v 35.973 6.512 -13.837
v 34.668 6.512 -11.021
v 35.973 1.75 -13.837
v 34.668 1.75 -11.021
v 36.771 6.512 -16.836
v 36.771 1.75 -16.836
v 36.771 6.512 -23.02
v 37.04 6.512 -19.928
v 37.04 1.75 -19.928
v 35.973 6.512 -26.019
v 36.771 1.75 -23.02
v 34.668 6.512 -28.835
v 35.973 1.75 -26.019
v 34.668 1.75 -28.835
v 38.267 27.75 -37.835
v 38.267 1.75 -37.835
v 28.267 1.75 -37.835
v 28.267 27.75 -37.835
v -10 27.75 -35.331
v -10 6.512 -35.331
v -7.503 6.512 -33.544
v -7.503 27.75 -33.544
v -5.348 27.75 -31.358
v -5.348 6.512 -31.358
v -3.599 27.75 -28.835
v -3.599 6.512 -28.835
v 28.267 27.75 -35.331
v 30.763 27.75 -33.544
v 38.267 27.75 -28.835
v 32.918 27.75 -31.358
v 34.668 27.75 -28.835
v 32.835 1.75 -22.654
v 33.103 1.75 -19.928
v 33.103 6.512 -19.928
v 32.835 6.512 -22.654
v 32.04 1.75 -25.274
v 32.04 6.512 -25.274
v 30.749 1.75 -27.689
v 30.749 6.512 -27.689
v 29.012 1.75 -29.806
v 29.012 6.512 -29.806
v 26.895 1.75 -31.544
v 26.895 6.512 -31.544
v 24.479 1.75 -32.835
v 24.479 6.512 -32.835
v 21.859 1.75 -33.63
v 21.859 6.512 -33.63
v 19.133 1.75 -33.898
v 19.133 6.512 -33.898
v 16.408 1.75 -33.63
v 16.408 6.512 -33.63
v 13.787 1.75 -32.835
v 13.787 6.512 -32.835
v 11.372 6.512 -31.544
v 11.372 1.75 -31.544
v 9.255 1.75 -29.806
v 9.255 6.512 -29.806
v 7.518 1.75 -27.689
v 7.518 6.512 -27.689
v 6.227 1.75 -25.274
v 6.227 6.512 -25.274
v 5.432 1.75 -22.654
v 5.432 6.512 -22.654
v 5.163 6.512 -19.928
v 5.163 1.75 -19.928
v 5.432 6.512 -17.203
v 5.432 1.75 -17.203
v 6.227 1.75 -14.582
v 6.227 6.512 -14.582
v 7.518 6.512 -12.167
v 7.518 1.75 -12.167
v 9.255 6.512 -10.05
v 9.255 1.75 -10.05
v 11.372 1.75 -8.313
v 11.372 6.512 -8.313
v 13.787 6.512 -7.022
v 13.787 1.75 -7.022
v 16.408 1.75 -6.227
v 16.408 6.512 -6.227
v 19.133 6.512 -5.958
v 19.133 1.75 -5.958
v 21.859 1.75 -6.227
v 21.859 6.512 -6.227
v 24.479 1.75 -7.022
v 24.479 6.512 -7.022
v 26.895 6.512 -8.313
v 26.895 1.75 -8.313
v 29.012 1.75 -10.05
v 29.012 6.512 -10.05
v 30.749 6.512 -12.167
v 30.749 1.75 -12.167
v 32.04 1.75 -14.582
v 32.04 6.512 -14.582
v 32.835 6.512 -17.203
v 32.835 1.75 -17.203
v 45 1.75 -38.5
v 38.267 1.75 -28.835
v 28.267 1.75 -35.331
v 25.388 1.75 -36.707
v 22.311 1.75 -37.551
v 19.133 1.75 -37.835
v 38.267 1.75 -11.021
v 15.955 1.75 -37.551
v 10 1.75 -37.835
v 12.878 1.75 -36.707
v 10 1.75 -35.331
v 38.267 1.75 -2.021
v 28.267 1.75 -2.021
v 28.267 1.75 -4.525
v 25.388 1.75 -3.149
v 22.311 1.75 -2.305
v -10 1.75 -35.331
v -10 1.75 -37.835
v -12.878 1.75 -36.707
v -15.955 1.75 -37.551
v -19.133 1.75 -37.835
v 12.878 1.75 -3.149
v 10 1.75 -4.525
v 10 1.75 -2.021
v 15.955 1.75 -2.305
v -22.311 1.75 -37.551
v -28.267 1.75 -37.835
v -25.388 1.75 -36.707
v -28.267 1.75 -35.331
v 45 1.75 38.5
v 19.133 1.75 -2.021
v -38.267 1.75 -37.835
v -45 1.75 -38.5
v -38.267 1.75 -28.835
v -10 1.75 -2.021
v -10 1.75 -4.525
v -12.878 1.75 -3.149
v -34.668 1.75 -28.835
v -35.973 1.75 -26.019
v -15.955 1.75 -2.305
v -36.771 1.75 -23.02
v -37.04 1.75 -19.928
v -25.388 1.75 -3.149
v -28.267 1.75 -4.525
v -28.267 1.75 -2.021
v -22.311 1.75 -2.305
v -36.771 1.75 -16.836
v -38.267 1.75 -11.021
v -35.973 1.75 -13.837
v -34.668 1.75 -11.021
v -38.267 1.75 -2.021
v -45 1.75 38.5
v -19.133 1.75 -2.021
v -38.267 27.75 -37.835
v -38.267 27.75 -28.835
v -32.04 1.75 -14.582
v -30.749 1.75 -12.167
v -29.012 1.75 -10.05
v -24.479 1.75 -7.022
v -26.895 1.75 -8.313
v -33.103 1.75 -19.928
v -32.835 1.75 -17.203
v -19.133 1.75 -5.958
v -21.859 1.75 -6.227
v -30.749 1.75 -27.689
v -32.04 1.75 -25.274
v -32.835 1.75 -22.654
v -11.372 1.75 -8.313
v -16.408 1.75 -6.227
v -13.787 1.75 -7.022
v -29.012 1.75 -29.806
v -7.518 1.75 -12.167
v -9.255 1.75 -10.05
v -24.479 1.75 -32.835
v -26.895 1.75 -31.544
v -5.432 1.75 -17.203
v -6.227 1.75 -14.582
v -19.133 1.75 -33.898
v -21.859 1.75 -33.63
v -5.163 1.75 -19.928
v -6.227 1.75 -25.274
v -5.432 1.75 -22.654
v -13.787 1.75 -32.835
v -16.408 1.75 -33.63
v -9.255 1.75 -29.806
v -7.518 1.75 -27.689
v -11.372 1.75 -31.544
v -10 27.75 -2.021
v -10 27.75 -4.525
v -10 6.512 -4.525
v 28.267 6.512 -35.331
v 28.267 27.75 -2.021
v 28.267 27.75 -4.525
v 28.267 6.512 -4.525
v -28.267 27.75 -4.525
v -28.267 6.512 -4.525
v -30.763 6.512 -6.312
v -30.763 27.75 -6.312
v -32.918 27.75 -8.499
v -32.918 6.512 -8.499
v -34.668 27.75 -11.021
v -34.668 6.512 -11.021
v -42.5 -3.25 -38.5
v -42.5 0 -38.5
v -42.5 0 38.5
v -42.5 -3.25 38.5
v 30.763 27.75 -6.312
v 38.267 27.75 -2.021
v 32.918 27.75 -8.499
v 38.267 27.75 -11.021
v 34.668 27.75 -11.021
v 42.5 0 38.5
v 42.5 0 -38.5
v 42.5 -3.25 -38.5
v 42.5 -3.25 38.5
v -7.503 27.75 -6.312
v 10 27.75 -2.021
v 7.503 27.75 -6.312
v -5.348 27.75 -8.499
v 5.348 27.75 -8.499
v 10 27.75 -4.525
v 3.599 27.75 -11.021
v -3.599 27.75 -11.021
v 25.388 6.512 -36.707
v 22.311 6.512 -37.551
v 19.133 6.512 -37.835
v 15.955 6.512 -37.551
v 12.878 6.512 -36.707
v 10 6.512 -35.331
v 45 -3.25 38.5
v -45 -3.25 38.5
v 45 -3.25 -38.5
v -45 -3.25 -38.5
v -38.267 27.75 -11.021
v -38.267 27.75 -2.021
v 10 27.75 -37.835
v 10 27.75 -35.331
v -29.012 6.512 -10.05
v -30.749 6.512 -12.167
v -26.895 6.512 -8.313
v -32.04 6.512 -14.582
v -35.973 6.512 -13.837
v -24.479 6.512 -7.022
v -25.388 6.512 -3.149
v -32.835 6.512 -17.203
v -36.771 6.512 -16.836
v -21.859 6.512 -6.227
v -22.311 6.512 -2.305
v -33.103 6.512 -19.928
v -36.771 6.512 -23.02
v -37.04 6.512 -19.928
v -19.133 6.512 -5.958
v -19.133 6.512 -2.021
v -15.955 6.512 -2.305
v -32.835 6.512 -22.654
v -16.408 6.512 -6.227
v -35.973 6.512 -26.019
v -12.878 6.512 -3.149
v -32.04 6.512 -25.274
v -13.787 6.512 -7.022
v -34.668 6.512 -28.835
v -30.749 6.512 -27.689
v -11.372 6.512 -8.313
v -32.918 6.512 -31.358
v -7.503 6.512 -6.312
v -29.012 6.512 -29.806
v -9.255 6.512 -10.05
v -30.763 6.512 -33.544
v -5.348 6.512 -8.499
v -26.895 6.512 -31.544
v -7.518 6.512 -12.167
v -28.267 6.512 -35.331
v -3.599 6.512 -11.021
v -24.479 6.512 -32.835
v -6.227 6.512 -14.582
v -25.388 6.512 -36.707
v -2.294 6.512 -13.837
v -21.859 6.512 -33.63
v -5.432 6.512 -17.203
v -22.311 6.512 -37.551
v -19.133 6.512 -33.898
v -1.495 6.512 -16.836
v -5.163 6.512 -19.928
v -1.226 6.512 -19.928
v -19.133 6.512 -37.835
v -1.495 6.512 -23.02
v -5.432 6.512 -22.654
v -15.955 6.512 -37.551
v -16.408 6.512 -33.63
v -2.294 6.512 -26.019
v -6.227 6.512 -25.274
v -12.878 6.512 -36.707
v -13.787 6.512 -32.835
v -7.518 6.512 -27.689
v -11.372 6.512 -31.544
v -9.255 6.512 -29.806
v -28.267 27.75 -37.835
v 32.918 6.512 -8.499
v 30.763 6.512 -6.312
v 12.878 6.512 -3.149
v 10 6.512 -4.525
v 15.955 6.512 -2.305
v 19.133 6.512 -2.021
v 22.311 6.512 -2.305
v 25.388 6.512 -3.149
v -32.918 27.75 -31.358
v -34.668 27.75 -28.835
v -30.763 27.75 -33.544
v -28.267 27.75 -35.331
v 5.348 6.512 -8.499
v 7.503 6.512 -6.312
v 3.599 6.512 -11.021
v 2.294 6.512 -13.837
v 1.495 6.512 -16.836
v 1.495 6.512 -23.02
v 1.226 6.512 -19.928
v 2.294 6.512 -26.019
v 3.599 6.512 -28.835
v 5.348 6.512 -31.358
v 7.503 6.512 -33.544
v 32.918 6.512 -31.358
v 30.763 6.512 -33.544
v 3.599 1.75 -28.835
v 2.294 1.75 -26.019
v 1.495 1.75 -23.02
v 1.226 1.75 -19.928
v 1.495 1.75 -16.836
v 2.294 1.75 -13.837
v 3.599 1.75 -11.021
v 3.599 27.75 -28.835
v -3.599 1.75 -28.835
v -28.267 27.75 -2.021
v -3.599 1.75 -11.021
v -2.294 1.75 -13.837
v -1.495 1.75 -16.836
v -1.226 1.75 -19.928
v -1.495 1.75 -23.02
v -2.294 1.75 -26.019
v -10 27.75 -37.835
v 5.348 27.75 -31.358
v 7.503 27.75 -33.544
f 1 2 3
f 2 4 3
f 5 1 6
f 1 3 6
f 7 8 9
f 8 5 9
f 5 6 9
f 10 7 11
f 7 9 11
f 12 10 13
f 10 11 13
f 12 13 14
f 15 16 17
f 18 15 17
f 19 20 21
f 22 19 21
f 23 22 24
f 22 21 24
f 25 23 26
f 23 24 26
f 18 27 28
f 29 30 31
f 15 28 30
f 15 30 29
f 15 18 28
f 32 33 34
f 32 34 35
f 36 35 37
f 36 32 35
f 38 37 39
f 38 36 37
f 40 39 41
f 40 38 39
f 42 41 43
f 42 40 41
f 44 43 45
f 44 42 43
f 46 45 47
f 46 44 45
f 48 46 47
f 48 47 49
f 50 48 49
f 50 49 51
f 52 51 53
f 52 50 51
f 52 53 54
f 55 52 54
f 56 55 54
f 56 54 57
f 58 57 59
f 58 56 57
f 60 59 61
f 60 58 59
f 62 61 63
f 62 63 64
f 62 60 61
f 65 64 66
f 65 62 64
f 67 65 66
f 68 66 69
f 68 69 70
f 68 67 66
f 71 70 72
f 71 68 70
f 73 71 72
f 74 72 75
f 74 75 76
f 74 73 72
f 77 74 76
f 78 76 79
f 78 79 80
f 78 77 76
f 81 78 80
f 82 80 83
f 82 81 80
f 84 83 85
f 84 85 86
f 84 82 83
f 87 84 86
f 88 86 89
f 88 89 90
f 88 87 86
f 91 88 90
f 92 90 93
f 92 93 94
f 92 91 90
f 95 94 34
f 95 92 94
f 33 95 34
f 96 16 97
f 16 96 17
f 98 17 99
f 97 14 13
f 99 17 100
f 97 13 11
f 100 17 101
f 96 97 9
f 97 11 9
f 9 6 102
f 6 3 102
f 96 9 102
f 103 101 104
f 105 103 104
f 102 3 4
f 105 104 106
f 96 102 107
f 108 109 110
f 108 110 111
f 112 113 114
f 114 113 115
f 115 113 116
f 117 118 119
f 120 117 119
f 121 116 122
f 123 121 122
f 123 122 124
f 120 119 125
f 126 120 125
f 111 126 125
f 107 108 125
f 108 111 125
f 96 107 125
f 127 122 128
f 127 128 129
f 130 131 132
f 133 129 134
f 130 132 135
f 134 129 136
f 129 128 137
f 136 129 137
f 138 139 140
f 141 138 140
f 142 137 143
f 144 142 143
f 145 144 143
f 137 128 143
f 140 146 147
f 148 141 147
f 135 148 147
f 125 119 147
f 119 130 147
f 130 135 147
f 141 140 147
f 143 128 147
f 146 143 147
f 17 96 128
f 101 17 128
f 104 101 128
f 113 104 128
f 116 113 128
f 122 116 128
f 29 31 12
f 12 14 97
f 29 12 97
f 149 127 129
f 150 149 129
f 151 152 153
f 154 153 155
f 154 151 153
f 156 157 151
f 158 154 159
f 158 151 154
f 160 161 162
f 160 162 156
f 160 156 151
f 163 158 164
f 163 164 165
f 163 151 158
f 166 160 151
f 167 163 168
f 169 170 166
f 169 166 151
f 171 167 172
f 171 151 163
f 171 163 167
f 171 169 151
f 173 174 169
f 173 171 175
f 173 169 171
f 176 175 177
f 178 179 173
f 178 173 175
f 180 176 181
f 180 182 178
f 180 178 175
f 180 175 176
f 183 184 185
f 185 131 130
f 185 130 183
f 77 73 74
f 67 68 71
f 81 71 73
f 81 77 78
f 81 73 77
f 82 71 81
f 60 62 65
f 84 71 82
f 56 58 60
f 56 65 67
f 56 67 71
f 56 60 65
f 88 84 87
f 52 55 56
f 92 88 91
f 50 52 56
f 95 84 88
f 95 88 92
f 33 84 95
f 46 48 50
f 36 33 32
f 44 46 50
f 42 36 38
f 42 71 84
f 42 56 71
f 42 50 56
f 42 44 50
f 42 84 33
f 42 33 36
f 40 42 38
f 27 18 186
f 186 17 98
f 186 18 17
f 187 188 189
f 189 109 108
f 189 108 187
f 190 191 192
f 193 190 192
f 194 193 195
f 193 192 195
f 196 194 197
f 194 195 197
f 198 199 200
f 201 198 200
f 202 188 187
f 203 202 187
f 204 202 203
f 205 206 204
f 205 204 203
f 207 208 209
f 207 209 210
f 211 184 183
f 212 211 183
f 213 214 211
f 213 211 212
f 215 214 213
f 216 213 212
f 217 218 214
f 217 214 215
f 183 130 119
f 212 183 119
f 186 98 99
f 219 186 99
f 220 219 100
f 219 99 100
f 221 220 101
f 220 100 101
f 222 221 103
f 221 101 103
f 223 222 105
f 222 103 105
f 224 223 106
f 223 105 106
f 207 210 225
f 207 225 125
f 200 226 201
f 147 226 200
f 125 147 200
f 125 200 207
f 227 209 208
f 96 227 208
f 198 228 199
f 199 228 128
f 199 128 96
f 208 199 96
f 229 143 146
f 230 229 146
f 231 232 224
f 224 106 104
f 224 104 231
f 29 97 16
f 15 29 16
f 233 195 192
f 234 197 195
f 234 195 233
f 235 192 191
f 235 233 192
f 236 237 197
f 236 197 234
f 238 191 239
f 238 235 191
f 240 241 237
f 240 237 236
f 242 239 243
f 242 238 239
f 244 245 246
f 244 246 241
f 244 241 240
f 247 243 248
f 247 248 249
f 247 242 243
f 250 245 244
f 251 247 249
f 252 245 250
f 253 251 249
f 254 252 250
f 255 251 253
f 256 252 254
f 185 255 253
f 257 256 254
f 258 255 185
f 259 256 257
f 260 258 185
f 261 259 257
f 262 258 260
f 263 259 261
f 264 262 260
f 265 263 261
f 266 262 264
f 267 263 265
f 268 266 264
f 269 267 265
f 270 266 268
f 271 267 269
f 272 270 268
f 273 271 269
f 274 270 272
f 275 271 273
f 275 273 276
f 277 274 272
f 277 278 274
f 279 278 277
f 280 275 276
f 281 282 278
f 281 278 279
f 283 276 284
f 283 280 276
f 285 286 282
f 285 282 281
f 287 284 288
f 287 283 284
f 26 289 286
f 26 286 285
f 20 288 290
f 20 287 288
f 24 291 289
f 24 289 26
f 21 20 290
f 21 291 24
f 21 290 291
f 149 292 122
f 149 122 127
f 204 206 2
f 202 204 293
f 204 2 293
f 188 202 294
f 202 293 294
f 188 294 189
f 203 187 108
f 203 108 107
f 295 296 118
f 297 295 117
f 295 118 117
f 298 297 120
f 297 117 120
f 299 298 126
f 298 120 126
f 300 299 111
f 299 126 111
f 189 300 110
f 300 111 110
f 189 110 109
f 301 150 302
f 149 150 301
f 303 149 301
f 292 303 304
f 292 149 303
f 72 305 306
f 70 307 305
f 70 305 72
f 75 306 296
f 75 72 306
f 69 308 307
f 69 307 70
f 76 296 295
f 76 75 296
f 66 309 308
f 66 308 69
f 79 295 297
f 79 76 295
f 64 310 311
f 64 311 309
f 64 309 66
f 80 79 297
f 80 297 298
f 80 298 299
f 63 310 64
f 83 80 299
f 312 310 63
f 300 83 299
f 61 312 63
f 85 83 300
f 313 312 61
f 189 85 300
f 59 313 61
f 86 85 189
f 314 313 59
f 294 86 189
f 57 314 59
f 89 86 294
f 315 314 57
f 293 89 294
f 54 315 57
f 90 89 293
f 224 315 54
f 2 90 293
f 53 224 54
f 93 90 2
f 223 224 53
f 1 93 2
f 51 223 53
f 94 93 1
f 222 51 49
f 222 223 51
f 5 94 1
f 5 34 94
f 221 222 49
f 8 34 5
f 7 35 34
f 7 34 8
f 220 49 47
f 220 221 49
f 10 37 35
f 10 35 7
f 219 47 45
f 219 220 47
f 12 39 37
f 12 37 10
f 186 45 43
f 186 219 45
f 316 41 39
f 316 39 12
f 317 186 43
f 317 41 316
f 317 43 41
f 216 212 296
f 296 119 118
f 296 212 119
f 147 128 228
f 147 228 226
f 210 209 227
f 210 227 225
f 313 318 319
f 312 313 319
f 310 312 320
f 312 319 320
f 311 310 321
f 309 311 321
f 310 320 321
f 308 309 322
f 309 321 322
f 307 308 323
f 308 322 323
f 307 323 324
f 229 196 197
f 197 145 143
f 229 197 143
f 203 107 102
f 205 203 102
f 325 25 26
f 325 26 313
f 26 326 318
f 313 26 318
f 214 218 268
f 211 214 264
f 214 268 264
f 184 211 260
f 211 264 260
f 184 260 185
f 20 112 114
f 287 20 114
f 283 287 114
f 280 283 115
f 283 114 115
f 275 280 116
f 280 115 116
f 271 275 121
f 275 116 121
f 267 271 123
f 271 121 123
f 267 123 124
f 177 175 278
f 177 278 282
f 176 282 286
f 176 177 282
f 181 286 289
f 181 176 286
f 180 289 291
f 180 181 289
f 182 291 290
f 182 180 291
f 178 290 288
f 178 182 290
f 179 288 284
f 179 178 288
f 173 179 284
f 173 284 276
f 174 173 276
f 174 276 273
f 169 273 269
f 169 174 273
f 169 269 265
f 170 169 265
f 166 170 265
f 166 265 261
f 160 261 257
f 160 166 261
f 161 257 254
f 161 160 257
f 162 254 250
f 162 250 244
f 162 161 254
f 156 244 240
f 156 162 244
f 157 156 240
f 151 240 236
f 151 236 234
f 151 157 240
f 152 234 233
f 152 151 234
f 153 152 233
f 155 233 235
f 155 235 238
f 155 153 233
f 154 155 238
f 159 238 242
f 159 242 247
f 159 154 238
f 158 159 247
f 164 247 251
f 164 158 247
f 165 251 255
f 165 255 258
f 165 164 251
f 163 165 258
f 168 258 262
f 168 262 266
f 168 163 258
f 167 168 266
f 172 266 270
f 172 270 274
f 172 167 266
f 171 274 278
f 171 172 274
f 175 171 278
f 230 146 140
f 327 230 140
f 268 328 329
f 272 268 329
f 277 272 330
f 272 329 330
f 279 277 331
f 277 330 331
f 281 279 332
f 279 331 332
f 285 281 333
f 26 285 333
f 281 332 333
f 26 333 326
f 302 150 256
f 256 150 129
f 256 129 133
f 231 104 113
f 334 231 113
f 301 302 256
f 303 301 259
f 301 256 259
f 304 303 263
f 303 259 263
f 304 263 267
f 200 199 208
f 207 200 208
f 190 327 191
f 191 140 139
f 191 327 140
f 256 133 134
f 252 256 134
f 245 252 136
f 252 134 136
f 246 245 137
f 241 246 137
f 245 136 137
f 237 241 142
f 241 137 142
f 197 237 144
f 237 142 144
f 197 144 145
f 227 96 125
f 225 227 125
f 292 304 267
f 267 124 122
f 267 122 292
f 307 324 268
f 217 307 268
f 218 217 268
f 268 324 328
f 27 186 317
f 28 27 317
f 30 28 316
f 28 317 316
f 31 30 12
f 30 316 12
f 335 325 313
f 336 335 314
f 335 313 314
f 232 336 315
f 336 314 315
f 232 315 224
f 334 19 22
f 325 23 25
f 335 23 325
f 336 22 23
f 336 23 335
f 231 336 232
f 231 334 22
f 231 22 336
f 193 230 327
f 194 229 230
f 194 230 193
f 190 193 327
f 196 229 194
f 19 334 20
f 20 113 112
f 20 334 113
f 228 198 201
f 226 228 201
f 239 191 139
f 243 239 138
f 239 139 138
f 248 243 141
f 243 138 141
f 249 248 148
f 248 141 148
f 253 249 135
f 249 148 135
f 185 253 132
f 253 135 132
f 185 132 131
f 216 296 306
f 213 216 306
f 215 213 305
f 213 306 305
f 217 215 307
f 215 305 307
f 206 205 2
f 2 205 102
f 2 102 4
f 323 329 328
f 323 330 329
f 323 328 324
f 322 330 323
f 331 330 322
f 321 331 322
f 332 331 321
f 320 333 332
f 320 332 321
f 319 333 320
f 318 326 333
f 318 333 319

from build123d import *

# Parameters (mm, degrees)
SKETCH1_W           = 85
SKETCH1_H           = 77
BOSS_EXTRUDE1_DEPTH = 1.75
SKETCH3_R           = 17.907
SKETCH3_R_2         = 13.97
BOSS_EXTRUDE3_DEPTH = 4.7625
BOSS_EXTRUDE7_DEPTH = 26
SKETCH6_W           = 77
SKETCH6_H           = 5
BOSS_EXTRUDE8_DEPTH = 2.5


with BuildPart() as part:
    # Sketch1 → Boss-Extrude1 (new body)
    with BuildSketch(Plane(origin=(0, 0, 0), x_dir=(1, 0, 0), z_dir=(0, 1, 0))):
        Rectangle(SKETCH1_W, SKETCH1_H)
    extrude(amount=BOSS_EXTRUDE1_DEPTH)

    # Sketch3 → Boss-Extrude3 (add)
    with BuildSketch(Plane(origin=(0, 1.75, 0), x_dir=(1, 0, 0), z_dir=(0, 1, 0))):
        with Locations((19.133331774, 19.92813227)):
            Circle(SKETCH3_R)
        with Locations((19.133331774, 19.92813227)):
            Circle(SKETCH3_R_2, mode=Mode.SUBTRACT)
        with Locations((-19.133331774, 19.92813227)):
            Circle(SKETCH3_R)
        with Locations((-19.133331774, 19.92813227)):
            Circle(SKETCH3_R_2, mode=Mode.SUBTRACT)
    extrude(amount=BOSS_EXTRUDE3_DEPTH)

    # Sketch4 → Boss-Extrude7 (add)
    with BuildSketch(Plane(origin=(0, 1.75, 0), x_dir=(1, 0, 0), z_dir=(0, 1, 0))):
        with BuildLine():
            ThreePointArc((-34.668002675, 28.83513227), (-31.887785522, 32.497323119), (-28.266663548, 35.330823584))
            Line((-28.266663548, 35.330823584), (-28.266663548, 37.83513227))
            Line((-28.266663548, 37.83513227), (-38.266663548, 37.83513227))
            Line((-38.266663548, 37.83513227), (-38.266663548, 28.83513227))
            Line((-38.266663548, 28.83513227), (-34.668002675, 28.83513227))
        make_face()
        with BuildLine():
            ThreePointArc((-28.266663548, 4.525440956), (-31.887785522, 7.358941421), (-34.668002675, 11.02113227))
            Line((-34.668002675, 11.02113227), (-38.266663548, 11.02113227))
            Line((-38.266663548, 11.02113227), (-38.266663548, 2.02113227))
            Line((-38.266663548, 2.02113227), (-28.266663548, 2.02113227))
            Line((-28.266663548, 2.02113227), (-28.266663548, 4.525440956))
        make_face()
        with BuildLine():
            Line((0, 11.02113227), (-3.598660873, 11.02113227))
            ThreePointArc((-3.598660873, 11.02113227), (-6.378878026, 7.358941421), (-10, 4.525440956))
            Line((-10, 4.525440956), (-10, 2.02113227))
            Line((-10, 2.02113227), (0, 2.02113227))
            Line((0, 2.02113227), (0, 11.02113227))
        make_face()
        with BuildLine():
            ThreePointArc((10, 4.525440956), (6.378878026, 7.358941421), (3.598660873, 11.02113227))
            Line((3.598660873, 11.02113227), (0, 11.02113227))
            Line((0, 11.02113227), (0, 2.02113227))
            Line((0, 2.02113227), (10, 2.02113227))
            Line((10, 2.02113227), (10, 4.525440956))
        make_face()
        with BuildLine():
            Line((0, 28.83513227), (0, 37.83513227))
            Line((0, 37.83513227), (-10, 37.83513227))
            Line((-10, 37.83513227), (-10, 35.330823584))
            ThreePointArc((-10, 35.330823584), (-6.378878026, 32.497323119), (-3.598660873, 28.83513227))
            Line((-3.598660873, 28.83513227), (0, 28.83513227))
        make_face()
        with BuildLine():
            Line((10, 37.83513227), (0, 37.83513227))
            Line((0, 37.83513227), (0, 28.83513227))
            Line((0, 28.83513227), (3.598660873, 28.83513227))
            ThreePointArc((3.598660873, 28.83513227), (6.378878026, 32.497323119), (10, 35.330823584))
            Line((10, 35.330823584), (10, 37.83513227))
        make_face()
        with BuildLine():
            Line((28.266663548, 37.83513227), (28.266663548, 35.330823584))
            ThreePointArc((28.266663548, 35.330823584), (31.887785522, 32.497323119), (34.668002675, 28.83513227))
            Line((34.668002675, 28.83513227), (38.266663548, 28.83513227))
            Line((38.266663548, 28.83513227), (38.266663548, 37.83513227))
            Line((38.266663548, 37.83513227), (28.266663548, 37.83513227))
        make_face()
        with BuildLine():
            ThreePointArc((34.668002675, 11.02113227), (31.887785522, 7.358941421), (28.266663548, 4.525440956))
            Line((28.266663548, 4.525440956), (28.266663548, 2.02113227))
            Line((28.266663548, 2.02113227), (38.266663548, 2.02113227))
            Line((38.266663548, 2.02113227), (38.266663548, 11.02113227))
            Line((38.266663548, 11.02113227), (34.668002675, 11.02113227))
        make_face()
    extrude(amount=BOSS_EXTRUDE7_DEPTH)

    # Sketch6 → Boss-Extrude8 (add)
    with BuildSketch(Plane.ZY.offset(42.5)):
        with Locations((0, -0.75)):
            Rectangle(SKETCH6_W, SKETCH6_H)
    boss_extrude8 = extrude(amount=BOSS_EXTRUDE8_DEPTH)

    # Mirror1: Boss-Extrude8 across plane
    add(boss_extrude8.mirror(Plane(origin=(0, 0, 0), x_dir=(0, 0, 1), z_dir=(1, 0, 0))))


solid = part.part
